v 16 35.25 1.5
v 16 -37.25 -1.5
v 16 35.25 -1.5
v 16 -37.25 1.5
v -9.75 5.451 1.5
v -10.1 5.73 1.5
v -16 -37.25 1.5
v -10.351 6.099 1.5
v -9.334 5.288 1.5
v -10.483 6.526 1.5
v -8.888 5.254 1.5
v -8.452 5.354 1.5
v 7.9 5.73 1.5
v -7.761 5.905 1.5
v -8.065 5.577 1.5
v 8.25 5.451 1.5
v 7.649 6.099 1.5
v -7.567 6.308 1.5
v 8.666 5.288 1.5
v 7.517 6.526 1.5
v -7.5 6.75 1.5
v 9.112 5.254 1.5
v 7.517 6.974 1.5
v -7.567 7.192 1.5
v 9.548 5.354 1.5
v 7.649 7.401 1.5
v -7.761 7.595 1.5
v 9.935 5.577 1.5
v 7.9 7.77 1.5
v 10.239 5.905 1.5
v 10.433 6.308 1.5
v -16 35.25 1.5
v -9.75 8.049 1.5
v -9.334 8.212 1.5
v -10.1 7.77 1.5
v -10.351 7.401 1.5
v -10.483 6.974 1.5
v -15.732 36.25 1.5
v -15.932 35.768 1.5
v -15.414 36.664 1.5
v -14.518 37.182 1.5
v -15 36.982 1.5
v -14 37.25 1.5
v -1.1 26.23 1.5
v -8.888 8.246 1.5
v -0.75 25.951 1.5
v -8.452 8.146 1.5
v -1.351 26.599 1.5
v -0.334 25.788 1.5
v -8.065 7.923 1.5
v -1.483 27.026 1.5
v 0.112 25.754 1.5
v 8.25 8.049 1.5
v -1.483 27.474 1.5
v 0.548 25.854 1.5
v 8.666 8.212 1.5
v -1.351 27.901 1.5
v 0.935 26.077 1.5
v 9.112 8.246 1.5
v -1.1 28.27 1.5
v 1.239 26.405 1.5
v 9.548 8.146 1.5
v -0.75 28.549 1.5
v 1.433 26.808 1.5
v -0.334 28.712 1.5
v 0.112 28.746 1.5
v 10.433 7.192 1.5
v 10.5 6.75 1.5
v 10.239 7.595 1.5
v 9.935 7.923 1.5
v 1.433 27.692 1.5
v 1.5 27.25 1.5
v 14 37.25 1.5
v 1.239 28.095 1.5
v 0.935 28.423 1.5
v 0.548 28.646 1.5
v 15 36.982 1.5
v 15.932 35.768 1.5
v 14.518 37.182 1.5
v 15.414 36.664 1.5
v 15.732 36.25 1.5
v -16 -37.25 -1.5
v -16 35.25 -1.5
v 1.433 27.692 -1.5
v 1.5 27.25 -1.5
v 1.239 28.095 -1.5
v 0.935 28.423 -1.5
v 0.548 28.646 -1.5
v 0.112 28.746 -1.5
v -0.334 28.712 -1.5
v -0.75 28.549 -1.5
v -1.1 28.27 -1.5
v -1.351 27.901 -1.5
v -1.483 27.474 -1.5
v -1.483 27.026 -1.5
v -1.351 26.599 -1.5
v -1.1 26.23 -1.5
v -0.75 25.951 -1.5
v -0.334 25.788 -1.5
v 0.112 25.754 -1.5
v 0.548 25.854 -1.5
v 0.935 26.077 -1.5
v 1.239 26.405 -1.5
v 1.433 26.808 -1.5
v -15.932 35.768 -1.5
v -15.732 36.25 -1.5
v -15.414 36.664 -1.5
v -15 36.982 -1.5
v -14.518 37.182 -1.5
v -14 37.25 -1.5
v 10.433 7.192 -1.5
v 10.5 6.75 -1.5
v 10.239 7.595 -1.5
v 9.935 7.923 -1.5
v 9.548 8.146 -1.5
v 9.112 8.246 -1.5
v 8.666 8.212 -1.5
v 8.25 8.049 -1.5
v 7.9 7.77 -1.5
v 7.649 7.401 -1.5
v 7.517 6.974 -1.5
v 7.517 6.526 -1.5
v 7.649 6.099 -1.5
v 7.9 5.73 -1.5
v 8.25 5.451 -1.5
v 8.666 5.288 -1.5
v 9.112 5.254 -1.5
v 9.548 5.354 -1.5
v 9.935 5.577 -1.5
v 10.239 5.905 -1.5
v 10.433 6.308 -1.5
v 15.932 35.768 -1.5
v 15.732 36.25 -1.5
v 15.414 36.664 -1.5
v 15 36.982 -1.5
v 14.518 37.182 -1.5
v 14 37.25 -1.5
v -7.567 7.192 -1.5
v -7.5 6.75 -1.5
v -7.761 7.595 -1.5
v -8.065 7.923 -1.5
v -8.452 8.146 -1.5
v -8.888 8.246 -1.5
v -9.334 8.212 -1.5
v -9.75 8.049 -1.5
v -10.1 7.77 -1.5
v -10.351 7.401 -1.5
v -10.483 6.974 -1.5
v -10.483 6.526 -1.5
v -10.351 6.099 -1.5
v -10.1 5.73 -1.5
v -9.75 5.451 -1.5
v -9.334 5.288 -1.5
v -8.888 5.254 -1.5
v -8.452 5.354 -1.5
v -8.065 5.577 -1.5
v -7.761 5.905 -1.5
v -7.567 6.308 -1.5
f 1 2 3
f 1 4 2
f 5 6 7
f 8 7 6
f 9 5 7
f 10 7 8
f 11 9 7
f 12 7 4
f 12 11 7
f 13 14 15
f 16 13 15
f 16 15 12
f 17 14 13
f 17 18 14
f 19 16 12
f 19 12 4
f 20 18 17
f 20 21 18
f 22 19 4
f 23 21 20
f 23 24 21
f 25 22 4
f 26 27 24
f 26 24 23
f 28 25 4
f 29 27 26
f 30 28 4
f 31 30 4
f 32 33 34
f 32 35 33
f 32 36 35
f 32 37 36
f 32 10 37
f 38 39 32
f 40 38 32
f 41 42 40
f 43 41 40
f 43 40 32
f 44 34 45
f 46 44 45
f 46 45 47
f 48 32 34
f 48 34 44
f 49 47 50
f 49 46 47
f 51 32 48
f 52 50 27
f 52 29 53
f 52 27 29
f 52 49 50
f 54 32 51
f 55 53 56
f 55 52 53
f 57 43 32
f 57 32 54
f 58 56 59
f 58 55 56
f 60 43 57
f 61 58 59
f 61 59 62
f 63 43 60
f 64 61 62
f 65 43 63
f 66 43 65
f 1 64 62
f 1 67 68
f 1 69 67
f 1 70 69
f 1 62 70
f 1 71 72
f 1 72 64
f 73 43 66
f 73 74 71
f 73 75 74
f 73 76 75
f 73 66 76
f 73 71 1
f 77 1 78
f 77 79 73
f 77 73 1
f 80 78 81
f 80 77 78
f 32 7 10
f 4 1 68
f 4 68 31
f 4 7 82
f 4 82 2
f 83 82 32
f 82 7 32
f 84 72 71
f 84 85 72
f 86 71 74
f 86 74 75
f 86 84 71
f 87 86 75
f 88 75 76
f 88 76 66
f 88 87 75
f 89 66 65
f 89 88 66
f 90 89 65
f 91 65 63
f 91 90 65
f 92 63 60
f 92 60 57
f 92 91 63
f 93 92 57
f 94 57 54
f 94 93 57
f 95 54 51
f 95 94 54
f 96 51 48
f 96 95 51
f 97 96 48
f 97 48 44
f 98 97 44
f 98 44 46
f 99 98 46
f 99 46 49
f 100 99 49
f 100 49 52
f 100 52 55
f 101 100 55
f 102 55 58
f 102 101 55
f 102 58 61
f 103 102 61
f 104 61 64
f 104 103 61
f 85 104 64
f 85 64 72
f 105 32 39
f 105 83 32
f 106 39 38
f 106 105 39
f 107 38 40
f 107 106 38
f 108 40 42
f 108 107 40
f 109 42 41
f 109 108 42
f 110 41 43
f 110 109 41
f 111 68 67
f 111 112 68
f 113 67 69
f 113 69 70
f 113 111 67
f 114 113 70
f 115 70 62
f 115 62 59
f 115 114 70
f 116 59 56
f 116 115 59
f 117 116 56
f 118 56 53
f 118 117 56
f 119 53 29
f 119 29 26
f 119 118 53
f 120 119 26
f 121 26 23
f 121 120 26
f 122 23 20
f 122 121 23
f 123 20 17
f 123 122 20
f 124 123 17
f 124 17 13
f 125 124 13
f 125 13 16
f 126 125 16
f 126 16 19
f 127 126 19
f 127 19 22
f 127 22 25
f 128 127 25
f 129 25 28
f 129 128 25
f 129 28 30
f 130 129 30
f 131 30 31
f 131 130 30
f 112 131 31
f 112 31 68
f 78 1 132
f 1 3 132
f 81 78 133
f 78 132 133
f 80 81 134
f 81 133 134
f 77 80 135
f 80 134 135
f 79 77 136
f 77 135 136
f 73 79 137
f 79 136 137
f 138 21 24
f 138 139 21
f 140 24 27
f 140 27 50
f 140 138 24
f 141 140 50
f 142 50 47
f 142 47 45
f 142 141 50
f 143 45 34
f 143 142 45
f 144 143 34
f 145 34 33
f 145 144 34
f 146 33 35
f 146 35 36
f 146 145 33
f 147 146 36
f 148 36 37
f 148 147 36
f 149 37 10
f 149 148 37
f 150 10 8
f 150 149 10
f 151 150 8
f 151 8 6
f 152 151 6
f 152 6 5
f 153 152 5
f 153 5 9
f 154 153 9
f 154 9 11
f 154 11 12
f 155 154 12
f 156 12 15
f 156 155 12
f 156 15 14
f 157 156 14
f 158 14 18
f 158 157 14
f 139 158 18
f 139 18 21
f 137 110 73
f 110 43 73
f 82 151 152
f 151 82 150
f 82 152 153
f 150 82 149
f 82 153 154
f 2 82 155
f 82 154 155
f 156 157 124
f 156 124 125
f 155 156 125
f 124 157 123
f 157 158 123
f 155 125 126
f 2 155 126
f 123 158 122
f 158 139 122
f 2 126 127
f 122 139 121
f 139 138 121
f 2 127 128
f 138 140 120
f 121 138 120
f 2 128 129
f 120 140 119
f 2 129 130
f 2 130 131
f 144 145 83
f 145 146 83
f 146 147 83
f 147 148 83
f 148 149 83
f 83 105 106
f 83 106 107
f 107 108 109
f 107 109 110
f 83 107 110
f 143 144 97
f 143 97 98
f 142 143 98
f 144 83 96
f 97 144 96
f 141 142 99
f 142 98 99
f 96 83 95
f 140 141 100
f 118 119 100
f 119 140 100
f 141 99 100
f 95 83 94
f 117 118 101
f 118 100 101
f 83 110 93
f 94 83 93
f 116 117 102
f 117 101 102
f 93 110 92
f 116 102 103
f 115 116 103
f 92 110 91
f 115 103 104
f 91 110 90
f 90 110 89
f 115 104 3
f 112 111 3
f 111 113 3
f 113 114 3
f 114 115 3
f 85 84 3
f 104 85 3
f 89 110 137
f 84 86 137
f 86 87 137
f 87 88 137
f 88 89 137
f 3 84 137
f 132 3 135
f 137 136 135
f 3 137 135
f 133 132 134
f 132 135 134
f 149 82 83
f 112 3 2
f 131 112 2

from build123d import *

# Parameters (mm, degrees)
CROQUIS1_W              = 32
CROQUIS1_H              = 74.5
CROQUIS1_R              = 1.5
SALIENTE_EXTRUIR1_DEPTH = 1.5
REDONDEO1_R             = 2


with BuildPart() as part:
    # Croquis1 → Saliente-Extruir1 (new, symmetric)
    with BuildSketch(Plane.XY):
        Rectangle(CROQUIS1_W, CROQUIS1_H)
        with Locations((0, 27.25)):
            Circle(CROQUIS1_R, mode=Mode.SUBTRACT)
        with Locations((-9, 6.75)):
            Circle(CROQUIS1_R, mode=Mode.SUBTRACT)
        with Locations((9, 6.75)):
            Circle(CROQUIS1_R, mode=Mode.SUBTRACT)
    extrude(amount=SALIENTE_EXTRUIR1_DEPTH, both=True)

    # Redondeo1
    redondeo1_edges = [part.edges().sort_by_distance(p)[0] for p in [
        (-16, 37.25, 0),
        (16, 37.25, 0),
    ]]
    fillet(redondeo1_edges, radius=REDONDEO1_R)


solid = part.part
